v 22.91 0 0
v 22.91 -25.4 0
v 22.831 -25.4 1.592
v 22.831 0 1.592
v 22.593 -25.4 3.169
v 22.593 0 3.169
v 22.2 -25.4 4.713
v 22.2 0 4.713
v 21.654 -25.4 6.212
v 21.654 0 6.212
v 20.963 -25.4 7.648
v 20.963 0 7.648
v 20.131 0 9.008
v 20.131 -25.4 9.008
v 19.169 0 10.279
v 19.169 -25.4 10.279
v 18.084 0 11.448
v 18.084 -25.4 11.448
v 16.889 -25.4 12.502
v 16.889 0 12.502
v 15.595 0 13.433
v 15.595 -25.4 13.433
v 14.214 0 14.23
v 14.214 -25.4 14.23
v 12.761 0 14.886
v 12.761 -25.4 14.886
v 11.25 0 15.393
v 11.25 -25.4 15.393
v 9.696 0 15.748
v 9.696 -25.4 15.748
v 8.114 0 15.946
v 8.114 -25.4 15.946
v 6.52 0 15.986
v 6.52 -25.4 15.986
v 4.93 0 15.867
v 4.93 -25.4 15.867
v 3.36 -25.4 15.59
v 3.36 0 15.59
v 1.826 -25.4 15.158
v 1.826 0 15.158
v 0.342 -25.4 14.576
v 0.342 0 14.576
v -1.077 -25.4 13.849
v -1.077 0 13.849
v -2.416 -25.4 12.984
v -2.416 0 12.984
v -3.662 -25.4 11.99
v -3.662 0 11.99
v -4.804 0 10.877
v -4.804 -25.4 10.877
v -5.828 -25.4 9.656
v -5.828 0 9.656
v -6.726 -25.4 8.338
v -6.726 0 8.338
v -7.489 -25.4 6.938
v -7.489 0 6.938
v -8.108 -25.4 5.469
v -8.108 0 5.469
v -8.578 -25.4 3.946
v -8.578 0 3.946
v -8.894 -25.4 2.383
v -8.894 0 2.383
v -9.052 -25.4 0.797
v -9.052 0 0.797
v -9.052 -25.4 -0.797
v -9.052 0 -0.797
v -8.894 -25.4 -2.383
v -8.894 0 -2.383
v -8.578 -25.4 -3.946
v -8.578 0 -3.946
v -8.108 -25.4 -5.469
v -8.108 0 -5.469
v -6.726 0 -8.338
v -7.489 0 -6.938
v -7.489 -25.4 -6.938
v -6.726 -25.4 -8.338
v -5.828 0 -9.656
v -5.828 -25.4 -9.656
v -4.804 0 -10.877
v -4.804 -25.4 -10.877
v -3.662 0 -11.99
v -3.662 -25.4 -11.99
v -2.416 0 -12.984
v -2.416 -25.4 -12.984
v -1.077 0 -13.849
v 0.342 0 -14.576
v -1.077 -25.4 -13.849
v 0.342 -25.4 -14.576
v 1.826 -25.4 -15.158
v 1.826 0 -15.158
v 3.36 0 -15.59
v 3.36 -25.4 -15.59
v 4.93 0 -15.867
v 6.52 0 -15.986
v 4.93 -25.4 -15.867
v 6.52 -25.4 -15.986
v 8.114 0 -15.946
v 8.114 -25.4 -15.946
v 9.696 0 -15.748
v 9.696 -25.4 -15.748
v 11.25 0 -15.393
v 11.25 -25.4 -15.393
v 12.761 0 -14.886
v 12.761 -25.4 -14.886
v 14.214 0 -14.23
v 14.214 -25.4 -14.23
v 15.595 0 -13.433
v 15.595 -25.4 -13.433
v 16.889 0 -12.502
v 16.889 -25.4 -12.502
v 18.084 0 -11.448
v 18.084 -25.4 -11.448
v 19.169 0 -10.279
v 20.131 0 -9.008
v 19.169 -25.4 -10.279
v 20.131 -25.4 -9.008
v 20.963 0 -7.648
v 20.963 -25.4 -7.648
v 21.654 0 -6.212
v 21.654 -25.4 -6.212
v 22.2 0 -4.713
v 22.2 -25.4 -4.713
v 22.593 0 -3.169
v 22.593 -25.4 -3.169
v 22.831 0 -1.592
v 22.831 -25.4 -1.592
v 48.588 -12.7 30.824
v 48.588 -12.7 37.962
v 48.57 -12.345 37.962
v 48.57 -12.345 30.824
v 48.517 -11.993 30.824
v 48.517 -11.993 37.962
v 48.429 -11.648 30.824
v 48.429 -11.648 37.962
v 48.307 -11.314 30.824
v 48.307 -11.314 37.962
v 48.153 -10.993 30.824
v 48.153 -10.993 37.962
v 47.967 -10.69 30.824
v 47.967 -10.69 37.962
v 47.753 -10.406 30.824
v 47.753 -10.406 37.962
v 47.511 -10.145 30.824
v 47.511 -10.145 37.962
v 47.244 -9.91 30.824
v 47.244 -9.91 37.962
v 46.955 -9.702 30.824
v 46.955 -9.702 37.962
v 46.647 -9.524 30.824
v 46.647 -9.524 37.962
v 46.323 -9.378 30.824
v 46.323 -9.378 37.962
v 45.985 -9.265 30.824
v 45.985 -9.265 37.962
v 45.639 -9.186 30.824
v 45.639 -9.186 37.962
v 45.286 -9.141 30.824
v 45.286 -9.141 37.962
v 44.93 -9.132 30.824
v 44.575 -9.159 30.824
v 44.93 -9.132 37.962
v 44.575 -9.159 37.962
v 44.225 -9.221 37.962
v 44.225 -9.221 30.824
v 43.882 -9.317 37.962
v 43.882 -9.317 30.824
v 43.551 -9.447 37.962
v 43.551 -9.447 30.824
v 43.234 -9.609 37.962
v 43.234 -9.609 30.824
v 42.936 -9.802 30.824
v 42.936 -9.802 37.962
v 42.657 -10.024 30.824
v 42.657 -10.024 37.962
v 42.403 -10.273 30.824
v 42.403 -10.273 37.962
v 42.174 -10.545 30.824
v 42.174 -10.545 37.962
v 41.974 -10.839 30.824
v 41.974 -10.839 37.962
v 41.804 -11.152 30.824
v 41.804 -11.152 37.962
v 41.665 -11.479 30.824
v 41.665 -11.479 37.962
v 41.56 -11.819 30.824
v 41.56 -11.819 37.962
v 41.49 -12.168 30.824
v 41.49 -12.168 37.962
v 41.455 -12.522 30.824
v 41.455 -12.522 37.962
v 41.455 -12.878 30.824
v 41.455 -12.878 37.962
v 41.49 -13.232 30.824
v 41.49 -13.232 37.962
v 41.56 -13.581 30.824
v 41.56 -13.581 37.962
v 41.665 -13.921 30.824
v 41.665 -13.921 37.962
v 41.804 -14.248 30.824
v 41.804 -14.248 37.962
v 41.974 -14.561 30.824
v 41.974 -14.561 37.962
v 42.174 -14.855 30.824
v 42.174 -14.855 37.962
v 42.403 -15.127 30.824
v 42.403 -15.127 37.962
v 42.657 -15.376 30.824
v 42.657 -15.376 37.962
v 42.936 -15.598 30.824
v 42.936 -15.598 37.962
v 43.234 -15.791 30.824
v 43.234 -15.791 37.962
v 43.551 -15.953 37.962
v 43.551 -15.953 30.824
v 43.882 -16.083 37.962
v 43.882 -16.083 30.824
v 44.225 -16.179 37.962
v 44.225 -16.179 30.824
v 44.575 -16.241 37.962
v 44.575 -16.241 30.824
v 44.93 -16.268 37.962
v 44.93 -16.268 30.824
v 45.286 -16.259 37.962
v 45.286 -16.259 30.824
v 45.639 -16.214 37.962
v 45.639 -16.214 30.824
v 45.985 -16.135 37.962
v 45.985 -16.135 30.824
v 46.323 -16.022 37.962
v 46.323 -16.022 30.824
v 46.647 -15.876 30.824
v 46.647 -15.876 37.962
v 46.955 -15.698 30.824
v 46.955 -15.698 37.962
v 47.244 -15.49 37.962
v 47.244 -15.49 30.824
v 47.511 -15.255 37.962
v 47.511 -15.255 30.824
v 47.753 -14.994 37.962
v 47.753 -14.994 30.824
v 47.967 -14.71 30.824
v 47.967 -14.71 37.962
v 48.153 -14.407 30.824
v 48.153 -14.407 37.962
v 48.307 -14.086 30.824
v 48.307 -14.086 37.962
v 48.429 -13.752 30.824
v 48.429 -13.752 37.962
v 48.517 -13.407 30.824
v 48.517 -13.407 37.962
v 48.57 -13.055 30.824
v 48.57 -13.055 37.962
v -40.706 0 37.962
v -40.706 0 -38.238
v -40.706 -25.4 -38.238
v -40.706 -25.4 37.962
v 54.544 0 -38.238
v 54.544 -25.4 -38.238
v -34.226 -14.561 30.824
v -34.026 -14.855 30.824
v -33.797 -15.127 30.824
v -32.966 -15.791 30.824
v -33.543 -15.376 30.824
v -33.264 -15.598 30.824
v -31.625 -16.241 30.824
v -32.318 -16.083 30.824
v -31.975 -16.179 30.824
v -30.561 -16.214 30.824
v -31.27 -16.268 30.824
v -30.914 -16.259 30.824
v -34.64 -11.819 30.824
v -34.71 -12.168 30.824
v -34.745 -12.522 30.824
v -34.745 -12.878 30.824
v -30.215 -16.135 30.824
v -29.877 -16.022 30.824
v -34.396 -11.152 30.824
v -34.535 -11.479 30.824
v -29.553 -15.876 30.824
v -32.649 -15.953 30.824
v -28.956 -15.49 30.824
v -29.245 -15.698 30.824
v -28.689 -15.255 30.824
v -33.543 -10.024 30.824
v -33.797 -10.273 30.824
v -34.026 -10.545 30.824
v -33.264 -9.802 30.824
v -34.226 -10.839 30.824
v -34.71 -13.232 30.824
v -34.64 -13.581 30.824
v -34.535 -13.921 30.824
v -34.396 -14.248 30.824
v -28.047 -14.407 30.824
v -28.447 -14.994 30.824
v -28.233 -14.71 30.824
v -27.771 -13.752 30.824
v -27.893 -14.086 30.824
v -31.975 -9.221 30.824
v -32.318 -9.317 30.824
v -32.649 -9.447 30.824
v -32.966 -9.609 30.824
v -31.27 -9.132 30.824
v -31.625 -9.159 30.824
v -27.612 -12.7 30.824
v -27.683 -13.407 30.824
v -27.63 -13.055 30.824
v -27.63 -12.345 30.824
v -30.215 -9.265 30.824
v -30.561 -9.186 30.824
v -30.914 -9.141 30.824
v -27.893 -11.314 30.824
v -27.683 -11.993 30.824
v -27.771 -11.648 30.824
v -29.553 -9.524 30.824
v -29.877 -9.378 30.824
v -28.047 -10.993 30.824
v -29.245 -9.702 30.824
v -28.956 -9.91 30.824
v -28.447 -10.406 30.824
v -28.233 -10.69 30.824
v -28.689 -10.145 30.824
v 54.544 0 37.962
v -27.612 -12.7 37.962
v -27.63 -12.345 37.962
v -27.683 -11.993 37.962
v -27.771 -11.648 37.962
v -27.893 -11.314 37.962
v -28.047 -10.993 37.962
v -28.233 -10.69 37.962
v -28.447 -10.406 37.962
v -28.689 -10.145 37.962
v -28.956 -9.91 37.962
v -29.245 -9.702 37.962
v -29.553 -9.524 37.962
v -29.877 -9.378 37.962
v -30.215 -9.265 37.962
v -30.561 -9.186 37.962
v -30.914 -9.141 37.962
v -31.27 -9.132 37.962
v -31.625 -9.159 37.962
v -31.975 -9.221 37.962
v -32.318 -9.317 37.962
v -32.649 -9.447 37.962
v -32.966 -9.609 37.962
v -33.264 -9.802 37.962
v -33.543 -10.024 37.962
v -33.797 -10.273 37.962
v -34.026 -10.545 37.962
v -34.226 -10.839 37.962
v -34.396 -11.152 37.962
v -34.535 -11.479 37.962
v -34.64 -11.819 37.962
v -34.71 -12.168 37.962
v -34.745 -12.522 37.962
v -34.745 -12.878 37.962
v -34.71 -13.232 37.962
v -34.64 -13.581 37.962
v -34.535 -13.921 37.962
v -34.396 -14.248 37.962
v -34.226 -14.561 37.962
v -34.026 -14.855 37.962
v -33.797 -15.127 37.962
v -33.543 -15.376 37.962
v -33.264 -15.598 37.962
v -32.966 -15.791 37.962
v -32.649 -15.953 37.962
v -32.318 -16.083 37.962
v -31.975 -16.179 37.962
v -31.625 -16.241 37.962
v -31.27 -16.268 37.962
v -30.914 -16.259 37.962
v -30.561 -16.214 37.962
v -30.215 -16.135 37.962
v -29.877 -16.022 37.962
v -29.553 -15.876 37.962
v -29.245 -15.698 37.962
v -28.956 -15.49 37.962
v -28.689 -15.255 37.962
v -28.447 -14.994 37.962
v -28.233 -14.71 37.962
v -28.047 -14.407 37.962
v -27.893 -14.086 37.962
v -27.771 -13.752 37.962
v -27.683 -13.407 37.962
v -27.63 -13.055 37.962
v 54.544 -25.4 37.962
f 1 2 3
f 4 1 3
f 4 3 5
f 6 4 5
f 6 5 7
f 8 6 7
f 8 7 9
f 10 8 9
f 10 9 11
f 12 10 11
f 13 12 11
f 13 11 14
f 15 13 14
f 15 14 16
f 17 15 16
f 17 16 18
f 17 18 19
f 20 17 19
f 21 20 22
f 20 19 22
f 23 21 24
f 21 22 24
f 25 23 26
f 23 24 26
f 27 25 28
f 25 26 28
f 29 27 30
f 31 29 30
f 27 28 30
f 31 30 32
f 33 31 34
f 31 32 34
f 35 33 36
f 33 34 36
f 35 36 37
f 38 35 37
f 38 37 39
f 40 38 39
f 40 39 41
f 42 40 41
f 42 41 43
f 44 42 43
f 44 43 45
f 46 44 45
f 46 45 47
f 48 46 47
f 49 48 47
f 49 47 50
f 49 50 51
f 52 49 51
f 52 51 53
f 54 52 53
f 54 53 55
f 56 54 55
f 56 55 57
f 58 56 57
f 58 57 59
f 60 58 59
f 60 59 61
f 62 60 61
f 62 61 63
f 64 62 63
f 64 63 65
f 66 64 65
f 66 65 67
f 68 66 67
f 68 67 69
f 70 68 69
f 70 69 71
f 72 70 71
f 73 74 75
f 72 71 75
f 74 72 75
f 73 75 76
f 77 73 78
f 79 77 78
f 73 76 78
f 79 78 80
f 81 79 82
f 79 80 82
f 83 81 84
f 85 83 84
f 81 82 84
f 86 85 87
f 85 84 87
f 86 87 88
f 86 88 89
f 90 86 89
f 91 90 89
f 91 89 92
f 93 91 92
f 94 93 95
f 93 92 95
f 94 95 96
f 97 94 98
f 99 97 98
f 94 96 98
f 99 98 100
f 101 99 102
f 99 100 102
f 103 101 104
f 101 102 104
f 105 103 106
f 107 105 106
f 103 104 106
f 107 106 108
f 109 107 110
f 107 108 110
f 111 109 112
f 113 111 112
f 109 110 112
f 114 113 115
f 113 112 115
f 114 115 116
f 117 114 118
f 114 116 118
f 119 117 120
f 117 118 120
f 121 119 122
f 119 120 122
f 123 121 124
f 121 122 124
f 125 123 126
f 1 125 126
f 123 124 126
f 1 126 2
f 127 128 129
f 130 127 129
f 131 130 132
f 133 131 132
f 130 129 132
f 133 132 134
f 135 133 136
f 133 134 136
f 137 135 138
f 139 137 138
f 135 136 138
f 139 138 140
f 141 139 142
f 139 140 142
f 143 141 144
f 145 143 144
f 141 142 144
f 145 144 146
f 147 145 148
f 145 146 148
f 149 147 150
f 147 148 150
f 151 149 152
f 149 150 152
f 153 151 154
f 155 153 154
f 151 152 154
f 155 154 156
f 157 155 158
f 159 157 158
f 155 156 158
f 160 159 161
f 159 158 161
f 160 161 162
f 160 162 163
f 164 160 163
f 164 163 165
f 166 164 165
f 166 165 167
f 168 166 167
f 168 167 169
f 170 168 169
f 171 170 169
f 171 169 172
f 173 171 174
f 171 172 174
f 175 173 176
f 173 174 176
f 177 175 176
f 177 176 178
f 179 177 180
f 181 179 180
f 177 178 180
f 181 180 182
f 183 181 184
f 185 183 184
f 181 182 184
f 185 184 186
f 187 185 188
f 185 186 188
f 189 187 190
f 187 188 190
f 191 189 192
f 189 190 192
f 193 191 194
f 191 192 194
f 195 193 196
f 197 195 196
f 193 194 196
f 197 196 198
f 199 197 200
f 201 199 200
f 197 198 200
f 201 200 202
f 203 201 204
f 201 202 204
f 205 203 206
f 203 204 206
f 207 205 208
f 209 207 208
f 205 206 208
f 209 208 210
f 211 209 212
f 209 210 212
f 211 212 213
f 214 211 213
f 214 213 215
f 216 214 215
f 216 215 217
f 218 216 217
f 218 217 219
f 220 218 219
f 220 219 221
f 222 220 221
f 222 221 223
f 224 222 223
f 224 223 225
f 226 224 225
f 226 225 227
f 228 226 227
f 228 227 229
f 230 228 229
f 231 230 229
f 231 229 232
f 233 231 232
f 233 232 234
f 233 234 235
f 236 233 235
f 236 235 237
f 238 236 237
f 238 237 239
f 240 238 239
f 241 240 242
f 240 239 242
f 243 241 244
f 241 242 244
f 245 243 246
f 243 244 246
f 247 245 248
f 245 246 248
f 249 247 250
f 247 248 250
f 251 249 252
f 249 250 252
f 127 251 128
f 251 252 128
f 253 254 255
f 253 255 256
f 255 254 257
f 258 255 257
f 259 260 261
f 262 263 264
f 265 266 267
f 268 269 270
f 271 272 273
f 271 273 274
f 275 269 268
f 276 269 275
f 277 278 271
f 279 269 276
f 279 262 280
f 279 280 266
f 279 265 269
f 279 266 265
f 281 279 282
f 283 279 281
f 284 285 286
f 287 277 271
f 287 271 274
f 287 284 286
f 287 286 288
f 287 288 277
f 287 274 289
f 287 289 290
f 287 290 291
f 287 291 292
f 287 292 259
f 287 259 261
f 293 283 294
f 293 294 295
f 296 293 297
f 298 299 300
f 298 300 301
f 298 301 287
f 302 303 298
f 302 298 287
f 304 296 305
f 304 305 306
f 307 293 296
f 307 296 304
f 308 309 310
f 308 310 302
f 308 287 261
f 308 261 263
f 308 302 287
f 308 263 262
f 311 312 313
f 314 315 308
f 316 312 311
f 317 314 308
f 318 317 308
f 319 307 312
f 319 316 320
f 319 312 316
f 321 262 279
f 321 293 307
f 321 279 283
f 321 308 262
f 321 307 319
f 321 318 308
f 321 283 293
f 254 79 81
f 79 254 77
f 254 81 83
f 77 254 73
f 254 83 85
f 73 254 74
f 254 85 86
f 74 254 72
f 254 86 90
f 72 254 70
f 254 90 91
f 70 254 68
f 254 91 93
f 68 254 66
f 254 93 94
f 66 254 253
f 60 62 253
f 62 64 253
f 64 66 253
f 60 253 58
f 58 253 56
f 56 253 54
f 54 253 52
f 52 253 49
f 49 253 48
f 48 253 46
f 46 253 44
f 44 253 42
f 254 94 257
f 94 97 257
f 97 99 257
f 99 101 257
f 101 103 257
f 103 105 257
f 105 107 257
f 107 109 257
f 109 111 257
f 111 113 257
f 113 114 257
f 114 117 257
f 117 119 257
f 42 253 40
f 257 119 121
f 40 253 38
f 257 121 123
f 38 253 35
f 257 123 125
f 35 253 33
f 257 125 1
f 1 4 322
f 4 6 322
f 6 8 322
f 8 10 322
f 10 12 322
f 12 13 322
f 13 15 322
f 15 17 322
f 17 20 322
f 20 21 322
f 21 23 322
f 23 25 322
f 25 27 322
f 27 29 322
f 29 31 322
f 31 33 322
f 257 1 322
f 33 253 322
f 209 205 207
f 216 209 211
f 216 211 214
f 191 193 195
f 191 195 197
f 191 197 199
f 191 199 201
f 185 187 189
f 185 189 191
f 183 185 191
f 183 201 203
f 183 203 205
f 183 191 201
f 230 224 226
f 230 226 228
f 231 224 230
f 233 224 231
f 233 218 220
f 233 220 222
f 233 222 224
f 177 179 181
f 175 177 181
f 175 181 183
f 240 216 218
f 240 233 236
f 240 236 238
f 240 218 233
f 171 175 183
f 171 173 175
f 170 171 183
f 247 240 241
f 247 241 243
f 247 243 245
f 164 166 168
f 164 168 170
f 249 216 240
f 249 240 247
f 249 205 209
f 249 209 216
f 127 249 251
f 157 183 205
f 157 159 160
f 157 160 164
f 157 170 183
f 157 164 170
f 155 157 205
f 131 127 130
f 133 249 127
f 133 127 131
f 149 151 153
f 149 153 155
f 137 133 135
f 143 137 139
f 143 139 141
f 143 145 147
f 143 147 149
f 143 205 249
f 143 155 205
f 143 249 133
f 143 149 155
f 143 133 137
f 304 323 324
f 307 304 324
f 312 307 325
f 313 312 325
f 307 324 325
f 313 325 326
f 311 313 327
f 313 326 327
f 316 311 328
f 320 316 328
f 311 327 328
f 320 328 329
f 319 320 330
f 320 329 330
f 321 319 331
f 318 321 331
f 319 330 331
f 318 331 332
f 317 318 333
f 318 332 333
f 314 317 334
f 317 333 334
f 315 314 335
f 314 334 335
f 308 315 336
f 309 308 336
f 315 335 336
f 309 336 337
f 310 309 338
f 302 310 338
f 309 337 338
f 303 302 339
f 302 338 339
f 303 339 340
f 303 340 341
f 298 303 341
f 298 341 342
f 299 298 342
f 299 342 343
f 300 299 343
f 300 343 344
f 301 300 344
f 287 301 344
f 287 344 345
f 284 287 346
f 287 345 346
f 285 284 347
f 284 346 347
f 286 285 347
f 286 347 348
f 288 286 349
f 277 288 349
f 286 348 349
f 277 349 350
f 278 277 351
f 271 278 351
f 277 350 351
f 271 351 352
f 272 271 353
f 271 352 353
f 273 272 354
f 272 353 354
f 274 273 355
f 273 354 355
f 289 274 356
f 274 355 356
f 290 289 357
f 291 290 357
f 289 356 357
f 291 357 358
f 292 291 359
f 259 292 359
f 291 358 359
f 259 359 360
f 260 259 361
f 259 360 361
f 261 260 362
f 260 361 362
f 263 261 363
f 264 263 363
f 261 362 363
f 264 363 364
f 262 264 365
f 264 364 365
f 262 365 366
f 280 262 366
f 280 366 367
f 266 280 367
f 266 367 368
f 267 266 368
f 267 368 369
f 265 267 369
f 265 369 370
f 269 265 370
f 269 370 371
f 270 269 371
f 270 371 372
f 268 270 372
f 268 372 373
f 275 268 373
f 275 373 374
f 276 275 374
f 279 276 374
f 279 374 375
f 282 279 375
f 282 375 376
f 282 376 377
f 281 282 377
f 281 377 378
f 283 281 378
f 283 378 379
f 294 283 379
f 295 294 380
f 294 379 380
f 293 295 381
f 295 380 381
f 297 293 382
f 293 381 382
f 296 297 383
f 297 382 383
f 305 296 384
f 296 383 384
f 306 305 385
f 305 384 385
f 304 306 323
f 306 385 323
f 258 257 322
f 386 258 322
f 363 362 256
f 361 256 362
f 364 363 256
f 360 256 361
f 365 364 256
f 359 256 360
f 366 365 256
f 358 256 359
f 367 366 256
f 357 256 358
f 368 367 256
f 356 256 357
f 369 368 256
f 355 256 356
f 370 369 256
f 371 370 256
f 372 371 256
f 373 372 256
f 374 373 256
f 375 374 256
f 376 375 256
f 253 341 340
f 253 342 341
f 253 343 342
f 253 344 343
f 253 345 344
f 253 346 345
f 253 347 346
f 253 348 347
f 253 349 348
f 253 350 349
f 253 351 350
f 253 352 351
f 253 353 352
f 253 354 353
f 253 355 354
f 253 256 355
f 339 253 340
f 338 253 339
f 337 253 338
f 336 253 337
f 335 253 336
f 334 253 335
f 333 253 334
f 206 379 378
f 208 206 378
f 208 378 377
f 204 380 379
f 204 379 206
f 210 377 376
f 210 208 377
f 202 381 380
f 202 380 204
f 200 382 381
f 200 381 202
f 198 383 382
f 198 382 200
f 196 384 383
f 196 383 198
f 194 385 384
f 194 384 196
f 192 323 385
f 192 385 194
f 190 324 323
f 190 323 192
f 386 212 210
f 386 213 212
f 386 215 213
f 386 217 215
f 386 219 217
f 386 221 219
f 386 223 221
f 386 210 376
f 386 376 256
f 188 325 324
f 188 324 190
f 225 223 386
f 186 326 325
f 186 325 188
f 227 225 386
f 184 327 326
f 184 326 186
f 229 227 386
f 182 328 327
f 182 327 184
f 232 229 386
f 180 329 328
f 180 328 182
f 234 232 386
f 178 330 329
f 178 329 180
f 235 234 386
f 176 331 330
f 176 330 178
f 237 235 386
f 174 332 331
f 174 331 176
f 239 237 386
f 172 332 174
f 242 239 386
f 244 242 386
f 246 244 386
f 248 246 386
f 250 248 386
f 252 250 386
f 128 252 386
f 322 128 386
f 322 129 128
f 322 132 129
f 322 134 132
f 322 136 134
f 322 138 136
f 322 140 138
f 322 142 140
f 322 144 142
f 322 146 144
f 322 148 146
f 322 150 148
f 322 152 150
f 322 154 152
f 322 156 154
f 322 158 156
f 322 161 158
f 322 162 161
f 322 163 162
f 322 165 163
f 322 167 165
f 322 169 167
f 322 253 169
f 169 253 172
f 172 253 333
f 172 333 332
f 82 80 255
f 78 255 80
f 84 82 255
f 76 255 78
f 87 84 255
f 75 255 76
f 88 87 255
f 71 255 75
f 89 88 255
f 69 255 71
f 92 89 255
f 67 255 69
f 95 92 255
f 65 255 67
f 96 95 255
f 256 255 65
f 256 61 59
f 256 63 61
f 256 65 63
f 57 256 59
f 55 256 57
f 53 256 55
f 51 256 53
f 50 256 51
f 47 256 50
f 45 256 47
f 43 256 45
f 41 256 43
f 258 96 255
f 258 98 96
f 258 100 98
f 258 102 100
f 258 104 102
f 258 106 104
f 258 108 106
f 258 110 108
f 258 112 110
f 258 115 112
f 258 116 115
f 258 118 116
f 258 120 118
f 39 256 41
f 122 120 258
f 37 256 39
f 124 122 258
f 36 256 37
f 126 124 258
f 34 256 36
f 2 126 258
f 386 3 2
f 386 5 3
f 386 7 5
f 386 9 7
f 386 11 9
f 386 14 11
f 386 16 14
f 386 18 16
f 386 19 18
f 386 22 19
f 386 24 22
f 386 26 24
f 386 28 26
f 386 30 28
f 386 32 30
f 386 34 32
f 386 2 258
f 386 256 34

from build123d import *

# Parameters (mm, degrees)
F0_W     = 95.25
F0_H     = 76.2
F1_DEPTH = 25.4
F2_R     = 15.99114
F3_DEPTH = 47.498
F4_R     = 3.5687
F5_DEPTH = 7.1374


with BuildPart() as f1:
    # F0 (on Front) → F1 (new body)
    with BuildSketch(Plane.XZ):
        with Locations((6.918825, -0.13822)):
            Rectangle(F0_W, F0_H)
    extrude(amount=F1_DEPTH)

    # F2 (on face) → F3 (cut)
    with BuildSketch(Plane.XZ.offset(25.4)):
        with Locations((6.918825, 0)):
            Circle(F2_R)
    extrude(amount=-F3_DEPTH, mode=Mode.SUBTRACT)

    # F4 (on face) → F5 (cut)
    with BuildSketch(Plane.XY.offset(37.96178)):
        with Locations((-31.181175, -12.7)):
            Circle(F4_R)
        with BuildLine():
            ThreePointArc((41.450125, -12.7), (45.018825, -16.2687), (48.587525, -12.7))
            ThreePointArc((48.587525, -12.7), (45.018825, -9.1313), (41.450125, -12.7))
        make_face()
    extrude(amount=-F5_DEPTH, mode=Mode.SUBTRACT)


solid = f1.part
